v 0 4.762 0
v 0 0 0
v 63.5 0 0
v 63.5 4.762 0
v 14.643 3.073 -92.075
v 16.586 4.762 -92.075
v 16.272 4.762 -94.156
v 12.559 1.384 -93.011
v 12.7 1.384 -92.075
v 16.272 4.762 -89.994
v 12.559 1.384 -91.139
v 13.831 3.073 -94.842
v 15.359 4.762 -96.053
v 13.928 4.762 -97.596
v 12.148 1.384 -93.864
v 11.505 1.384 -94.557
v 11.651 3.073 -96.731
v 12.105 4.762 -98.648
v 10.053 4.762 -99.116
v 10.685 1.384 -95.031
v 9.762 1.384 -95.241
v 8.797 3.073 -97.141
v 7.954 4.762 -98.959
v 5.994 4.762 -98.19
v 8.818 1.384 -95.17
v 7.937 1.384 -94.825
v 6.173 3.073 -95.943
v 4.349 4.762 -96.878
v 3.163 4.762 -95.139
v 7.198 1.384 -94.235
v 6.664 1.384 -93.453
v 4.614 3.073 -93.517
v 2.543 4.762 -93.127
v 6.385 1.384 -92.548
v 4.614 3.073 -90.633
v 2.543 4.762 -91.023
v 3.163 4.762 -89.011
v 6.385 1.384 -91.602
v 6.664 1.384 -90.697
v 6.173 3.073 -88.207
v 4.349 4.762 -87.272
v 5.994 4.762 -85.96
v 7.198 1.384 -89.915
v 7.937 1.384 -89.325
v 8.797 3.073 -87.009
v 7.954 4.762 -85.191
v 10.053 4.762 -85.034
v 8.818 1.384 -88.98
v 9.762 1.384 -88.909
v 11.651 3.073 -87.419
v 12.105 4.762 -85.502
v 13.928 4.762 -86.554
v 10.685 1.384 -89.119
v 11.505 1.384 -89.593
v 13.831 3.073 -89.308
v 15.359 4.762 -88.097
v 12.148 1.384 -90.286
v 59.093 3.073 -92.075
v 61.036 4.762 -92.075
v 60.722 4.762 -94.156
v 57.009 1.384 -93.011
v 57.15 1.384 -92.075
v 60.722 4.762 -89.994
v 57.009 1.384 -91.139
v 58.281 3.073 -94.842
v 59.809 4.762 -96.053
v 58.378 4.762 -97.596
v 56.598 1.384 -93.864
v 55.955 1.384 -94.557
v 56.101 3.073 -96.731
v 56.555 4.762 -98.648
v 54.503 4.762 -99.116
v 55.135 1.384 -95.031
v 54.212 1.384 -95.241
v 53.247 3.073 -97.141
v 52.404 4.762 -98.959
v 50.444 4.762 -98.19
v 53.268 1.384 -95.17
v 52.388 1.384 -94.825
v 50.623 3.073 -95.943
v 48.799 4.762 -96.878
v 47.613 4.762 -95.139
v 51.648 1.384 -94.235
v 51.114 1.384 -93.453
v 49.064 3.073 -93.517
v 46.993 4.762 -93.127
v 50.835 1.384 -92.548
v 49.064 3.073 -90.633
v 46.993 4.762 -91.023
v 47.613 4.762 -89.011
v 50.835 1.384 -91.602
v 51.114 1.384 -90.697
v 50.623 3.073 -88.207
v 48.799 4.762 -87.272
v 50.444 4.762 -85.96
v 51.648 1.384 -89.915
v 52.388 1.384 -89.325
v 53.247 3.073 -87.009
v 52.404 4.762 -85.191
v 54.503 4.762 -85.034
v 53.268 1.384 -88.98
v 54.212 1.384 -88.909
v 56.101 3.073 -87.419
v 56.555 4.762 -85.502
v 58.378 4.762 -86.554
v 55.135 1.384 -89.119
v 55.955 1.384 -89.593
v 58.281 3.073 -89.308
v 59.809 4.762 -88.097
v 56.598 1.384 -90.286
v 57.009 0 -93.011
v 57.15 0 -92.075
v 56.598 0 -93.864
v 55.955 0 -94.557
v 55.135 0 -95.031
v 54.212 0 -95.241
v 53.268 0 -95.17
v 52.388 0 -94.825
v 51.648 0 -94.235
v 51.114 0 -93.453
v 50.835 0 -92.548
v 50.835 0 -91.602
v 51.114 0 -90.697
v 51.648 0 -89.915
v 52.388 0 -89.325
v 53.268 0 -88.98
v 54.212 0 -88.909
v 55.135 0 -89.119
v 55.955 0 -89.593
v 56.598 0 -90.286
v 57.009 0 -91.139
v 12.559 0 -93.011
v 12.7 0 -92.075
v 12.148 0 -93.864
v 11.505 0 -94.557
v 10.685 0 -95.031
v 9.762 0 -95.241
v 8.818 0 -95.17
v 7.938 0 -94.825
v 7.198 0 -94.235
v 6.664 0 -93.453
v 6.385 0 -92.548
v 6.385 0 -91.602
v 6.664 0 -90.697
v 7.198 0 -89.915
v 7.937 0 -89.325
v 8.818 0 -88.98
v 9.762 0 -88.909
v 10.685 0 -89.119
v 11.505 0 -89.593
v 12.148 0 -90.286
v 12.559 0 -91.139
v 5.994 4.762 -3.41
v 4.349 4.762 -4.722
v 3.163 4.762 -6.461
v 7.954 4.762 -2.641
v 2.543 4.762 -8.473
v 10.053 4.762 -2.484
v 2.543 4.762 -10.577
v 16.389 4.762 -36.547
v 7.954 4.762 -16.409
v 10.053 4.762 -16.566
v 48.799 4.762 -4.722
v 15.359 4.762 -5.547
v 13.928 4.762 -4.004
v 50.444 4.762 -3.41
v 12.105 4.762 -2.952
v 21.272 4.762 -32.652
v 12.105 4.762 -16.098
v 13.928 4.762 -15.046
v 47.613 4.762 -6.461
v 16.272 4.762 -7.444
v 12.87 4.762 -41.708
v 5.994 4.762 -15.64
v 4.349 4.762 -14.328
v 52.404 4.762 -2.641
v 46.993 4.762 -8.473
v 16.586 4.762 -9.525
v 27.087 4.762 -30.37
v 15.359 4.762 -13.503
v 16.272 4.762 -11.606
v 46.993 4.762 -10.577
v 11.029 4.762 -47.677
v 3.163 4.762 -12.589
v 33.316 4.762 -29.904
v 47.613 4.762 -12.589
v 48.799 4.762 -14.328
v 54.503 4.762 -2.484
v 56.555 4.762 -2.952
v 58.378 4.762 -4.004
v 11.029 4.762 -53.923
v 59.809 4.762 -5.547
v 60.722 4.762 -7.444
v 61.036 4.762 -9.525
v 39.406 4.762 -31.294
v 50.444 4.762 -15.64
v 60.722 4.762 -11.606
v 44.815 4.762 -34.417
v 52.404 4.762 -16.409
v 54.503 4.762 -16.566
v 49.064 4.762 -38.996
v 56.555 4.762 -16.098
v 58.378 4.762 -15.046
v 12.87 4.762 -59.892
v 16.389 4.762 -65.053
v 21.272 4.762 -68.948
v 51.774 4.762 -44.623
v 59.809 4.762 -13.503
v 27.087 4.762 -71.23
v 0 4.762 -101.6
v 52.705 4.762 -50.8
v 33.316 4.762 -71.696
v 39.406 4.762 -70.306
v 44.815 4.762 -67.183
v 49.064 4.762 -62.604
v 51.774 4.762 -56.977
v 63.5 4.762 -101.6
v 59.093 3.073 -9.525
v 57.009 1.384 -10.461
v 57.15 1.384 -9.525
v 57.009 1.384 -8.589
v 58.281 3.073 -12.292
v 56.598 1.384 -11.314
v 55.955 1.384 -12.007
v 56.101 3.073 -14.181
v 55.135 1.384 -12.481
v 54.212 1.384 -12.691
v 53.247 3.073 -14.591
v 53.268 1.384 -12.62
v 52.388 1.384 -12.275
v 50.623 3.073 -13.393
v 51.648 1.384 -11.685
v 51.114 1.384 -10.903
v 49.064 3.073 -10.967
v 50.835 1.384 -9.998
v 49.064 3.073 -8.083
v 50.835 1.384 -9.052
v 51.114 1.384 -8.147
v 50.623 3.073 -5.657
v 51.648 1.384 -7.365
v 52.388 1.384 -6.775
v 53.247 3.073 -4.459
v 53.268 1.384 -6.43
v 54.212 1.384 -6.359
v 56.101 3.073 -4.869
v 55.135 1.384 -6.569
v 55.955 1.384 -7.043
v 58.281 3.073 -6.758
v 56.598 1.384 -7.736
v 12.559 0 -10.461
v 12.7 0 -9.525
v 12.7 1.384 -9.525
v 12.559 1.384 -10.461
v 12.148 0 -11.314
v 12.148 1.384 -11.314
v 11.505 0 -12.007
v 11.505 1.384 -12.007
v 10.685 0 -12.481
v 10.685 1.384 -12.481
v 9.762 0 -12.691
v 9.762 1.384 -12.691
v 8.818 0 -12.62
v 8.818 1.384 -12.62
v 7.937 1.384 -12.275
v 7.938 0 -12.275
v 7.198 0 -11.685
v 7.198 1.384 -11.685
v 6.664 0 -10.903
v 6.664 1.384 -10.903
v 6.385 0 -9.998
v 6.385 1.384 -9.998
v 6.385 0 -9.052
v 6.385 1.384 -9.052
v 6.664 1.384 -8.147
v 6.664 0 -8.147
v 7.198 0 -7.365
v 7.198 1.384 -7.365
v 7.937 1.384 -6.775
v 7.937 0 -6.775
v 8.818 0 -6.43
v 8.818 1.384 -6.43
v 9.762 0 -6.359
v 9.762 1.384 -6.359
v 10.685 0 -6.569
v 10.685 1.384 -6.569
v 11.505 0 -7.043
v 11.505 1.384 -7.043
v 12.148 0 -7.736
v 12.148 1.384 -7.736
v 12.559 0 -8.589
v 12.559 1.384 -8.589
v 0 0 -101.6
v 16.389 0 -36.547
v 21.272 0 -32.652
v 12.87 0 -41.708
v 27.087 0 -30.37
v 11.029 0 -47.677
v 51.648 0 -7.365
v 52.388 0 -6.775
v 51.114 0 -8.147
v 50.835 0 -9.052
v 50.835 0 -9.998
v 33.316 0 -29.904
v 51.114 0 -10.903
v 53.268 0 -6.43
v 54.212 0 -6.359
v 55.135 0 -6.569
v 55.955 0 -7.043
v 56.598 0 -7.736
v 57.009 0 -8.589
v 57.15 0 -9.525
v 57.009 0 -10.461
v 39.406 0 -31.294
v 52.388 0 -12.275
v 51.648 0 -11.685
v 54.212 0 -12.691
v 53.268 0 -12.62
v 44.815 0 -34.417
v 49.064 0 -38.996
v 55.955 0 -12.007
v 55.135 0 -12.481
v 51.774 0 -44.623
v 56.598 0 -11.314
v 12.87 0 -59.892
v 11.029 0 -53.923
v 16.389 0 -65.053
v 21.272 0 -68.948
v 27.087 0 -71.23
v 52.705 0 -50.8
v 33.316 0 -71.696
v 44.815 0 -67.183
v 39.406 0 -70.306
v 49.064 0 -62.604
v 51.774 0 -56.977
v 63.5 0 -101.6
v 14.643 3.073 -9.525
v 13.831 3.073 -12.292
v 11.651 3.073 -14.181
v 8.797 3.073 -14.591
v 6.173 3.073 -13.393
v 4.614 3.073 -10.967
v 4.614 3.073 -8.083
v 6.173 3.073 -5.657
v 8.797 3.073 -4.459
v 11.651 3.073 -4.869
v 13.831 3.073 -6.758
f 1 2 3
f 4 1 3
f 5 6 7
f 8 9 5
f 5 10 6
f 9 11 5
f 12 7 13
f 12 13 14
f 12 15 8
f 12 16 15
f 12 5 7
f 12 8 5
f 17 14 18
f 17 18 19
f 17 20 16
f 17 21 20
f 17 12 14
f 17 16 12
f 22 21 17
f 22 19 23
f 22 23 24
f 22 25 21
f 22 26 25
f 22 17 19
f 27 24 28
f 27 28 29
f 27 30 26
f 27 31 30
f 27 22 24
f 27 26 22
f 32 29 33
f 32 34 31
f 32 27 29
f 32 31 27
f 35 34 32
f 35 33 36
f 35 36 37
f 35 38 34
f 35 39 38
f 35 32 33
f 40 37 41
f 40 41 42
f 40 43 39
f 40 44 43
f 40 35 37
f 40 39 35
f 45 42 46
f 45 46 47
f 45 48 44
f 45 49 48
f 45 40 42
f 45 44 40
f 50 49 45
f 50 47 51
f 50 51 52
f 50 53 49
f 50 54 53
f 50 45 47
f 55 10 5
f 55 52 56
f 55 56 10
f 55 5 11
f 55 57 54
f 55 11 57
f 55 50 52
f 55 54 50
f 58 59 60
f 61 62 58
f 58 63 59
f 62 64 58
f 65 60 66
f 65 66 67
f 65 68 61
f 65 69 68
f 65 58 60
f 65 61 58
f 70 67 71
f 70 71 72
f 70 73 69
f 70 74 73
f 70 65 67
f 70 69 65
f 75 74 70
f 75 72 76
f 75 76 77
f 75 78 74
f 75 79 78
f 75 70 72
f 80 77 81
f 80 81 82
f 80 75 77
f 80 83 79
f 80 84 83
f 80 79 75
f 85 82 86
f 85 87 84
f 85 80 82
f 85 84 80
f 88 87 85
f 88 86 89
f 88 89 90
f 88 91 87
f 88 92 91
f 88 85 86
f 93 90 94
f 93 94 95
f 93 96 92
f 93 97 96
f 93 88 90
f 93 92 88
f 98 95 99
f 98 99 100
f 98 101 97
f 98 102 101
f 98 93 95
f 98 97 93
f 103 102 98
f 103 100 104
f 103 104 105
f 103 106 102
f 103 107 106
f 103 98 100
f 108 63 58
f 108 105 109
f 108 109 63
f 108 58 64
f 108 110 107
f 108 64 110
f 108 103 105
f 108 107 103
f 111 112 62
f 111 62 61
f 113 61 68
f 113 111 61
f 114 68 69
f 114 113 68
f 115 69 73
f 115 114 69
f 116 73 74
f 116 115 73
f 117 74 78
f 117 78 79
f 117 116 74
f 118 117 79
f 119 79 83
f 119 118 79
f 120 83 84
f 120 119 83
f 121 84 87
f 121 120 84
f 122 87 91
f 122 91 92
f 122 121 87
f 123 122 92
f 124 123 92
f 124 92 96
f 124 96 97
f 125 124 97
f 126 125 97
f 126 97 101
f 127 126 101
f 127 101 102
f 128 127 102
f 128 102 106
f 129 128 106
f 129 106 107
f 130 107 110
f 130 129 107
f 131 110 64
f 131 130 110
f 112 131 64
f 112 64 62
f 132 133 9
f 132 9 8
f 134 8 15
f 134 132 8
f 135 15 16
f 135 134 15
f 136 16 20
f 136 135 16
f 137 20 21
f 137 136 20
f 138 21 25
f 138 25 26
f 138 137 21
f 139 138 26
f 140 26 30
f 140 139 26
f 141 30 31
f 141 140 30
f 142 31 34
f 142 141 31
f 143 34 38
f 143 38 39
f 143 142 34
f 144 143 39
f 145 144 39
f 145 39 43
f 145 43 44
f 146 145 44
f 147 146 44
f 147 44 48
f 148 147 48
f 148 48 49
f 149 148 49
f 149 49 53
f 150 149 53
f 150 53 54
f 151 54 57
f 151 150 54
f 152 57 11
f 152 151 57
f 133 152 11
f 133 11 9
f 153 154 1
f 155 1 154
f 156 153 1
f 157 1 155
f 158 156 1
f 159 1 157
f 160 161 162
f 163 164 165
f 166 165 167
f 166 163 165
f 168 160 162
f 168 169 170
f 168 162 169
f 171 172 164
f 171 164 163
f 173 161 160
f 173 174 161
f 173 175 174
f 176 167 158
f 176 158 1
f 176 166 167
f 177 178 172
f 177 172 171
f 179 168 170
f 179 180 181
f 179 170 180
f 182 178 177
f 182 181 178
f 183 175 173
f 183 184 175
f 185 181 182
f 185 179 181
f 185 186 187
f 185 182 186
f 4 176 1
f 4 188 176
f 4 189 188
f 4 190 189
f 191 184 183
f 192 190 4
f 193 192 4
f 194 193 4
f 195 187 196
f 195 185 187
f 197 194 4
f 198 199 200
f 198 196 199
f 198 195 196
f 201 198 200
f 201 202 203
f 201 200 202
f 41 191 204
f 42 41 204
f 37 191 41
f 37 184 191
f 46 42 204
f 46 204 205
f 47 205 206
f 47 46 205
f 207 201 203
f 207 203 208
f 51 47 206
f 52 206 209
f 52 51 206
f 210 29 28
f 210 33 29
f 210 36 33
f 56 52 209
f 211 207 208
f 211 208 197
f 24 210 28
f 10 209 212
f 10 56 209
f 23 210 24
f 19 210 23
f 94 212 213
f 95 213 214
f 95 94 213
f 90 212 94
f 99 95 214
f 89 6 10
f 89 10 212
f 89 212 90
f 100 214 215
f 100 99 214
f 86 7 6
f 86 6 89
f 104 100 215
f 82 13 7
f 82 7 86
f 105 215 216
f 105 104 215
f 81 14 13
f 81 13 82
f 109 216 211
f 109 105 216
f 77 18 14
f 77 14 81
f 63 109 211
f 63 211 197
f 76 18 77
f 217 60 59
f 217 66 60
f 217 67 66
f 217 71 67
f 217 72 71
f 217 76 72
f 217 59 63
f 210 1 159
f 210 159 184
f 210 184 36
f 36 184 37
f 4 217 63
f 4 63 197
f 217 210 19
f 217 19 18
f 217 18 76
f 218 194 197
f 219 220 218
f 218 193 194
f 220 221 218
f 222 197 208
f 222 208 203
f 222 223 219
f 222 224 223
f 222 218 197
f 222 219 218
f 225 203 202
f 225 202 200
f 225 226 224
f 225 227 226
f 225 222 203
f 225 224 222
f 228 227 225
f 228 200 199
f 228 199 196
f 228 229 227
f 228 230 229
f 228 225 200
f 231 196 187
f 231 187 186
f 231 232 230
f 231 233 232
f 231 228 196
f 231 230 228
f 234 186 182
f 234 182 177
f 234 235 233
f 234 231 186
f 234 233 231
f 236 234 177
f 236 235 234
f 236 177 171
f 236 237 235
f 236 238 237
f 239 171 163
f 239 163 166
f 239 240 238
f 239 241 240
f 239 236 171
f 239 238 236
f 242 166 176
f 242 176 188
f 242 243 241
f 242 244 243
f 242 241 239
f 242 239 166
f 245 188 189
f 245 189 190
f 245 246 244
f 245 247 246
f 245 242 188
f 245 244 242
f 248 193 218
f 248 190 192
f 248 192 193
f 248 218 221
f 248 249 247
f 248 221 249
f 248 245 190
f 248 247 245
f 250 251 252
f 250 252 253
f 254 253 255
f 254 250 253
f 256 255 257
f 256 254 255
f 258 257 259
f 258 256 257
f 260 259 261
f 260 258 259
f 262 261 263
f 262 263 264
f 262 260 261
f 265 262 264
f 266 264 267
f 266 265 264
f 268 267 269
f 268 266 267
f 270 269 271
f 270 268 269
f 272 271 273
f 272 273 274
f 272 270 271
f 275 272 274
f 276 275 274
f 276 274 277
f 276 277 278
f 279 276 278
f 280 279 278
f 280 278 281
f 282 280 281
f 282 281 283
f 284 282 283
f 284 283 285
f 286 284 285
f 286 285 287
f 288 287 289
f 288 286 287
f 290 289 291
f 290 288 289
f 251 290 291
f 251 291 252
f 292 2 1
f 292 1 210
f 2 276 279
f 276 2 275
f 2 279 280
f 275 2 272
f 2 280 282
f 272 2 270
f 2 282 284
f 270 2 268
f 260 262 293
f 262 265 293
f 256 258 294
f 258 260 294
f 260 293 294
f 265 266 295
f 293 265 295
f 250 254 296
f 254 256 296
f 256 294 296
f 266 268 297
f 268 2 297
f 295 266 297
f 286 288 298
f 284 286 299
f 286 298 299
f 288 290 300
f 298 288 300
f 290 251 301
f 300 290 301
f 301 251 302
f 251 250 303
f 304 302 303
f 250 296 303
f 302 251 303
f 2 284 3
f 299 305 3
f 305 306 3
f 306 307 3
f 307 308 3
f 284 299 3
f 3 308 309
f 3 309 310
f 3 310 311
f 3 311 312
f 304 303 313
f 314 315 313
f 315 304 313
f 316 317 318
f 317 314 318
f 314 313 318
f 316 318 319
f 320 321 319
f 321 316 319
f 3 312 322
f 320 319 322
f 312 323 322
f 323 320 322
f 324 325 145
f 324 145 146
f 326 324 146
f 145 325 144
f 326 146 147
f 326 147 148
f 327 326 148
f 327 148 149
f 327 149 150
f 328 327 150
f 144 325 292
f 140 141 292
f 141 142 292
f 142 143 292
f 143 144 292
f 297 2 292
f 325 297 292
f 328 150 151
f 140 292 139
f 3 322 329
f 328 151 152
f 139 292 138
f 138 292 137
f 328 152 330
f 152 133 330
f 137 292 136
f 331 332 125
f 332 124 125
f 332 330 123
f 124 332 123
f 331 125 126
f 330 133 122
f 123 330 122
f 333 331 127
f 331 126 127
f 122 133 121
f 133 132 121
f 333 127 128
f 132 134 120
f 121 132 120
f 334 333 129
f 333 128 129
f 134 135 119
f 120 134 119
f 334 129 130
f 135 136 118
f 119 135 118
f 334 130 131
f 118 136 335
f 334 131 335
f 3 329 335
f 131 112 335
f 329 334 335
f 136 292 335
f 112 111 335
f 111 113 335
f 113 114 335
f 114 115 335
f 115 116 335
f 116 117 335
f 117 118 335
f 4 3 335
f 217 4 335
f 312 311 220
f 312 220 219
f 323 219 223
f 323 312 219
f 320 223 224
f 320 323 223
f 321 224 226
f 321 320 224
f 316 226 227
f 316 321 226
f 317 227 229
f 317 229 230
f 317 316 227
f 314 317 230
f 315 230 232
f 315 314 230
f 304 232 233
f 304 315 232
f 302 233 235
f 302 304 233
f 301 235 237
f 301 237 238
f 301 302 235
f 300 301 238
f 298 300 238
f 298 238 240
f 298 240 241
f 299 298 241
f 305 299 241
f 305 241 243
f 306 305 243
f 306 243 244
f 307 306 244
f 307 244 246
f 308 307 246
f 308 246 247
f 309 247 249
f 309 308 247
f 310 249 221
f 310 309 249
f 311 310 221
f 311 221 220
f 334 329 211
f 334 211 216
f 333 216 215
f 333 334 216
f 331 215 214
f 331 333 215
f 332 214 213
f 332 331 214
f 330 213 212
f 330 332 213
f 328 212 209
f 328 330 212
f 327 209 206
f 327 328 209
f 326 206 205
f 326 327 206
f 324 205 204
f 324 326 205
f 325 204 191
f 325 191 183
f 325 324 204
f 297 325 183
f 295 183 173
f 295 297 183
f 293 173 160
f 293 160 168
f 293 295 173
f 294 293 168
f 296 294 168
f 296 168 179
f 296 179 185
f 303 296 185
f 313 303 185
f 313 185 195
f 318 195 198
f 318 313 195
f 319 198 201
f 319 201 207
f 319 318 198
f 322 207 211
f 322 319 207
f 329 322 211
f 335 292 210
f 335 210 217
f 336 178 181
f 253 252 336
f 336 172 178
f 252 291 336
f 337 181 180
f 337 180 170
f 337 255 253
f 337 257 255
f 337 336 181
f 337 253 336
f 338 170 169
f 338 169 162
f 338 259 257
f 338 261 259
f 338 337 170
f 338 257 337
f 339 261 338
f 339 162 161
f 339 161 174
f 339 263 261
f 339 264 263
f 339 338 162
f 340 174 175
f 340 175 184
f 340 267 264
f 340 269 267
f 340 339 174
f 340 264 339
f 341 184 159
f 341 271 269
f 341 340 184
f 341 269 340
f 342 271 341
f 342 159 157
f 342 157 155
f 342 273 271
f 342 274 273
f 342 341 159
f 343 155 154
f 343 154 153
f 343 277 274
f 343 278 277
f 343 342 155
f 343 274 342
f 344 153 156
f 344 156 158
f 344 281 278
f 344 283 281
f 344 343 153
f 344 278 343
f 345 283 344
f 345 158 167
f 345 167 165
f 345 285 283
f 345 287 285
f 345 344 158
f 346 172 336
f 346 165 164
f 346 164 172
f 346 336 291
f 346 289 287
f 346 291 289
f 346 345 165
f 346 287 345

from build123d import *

# Parameters (mm, degrees)
SKETCH1_W           = 63.5
SKETCH1_H           = 101.6
SKETCH1_R           = 20.955
SKETCH1_R_2         = 3.175
BOSS_EXTRUDE1_DEPTH = 4.7625
CHAMFER1_SIZE       = 3.8862
CHAMFER1_SIZE2      = 3.378222121


with BuildPart() as part:
    # Sketch1 → Boss-Extrude1 (new body)
    with BuildSketch(Plane(origin=(0, 0, 0), x_dir=(1, 0, 0), z_dir=(0, 1, 0))):
        with Locations((31.75, 50.8)):
            Rectangle(SKETCH1_W, SKETCH1_H)
        with Locations((31.75, 50.8)):
            Circle(SKETCH1_R, mode=Mode.SUBTRACT)
        with Locations((9.525, 92.075)):
            Circle(SKETCH1_R_2, mode=Mode.SUBTRACT)
        with Locations((53.975, 92.075)):
            Circle(SKETCH1_R_2, mode=Mode.SUBTRACT)
        with Locations((53.975, 9.525)):
            Circle(SKETCH1_R_2, mode=Mode.SUBTRACT)
        with Locations((9.525, 9.525)):
            Circle(SKETCH1_R_2, mode=Mode.SUBTRACT)
    extrude(amount=BOSS_EXTRUDE1_DEPTH)

    # Chamfer1
    chamfer1_edges = [part.edges().sort_by_distance(p)[0] for p in [
        (6.35, 4.7625, -92.075),
        (50.8, 4.7625, -92.075),
        (50.8, 4.7625, -9.525),
        (6.35, 4.7625, -9.525),
    ]]
    chamfer1_side = [part.faces().sort_by_distance(p)[0] for p in [
        (31.75, 4.7625, -1.198115604),
    ]]
    chamfer(chamfer1_edges, length=CHAMFER1_SIZE, length2=CHAMFER1_SIZE2, reference=chamfer1_side[0])


solid = part.part
